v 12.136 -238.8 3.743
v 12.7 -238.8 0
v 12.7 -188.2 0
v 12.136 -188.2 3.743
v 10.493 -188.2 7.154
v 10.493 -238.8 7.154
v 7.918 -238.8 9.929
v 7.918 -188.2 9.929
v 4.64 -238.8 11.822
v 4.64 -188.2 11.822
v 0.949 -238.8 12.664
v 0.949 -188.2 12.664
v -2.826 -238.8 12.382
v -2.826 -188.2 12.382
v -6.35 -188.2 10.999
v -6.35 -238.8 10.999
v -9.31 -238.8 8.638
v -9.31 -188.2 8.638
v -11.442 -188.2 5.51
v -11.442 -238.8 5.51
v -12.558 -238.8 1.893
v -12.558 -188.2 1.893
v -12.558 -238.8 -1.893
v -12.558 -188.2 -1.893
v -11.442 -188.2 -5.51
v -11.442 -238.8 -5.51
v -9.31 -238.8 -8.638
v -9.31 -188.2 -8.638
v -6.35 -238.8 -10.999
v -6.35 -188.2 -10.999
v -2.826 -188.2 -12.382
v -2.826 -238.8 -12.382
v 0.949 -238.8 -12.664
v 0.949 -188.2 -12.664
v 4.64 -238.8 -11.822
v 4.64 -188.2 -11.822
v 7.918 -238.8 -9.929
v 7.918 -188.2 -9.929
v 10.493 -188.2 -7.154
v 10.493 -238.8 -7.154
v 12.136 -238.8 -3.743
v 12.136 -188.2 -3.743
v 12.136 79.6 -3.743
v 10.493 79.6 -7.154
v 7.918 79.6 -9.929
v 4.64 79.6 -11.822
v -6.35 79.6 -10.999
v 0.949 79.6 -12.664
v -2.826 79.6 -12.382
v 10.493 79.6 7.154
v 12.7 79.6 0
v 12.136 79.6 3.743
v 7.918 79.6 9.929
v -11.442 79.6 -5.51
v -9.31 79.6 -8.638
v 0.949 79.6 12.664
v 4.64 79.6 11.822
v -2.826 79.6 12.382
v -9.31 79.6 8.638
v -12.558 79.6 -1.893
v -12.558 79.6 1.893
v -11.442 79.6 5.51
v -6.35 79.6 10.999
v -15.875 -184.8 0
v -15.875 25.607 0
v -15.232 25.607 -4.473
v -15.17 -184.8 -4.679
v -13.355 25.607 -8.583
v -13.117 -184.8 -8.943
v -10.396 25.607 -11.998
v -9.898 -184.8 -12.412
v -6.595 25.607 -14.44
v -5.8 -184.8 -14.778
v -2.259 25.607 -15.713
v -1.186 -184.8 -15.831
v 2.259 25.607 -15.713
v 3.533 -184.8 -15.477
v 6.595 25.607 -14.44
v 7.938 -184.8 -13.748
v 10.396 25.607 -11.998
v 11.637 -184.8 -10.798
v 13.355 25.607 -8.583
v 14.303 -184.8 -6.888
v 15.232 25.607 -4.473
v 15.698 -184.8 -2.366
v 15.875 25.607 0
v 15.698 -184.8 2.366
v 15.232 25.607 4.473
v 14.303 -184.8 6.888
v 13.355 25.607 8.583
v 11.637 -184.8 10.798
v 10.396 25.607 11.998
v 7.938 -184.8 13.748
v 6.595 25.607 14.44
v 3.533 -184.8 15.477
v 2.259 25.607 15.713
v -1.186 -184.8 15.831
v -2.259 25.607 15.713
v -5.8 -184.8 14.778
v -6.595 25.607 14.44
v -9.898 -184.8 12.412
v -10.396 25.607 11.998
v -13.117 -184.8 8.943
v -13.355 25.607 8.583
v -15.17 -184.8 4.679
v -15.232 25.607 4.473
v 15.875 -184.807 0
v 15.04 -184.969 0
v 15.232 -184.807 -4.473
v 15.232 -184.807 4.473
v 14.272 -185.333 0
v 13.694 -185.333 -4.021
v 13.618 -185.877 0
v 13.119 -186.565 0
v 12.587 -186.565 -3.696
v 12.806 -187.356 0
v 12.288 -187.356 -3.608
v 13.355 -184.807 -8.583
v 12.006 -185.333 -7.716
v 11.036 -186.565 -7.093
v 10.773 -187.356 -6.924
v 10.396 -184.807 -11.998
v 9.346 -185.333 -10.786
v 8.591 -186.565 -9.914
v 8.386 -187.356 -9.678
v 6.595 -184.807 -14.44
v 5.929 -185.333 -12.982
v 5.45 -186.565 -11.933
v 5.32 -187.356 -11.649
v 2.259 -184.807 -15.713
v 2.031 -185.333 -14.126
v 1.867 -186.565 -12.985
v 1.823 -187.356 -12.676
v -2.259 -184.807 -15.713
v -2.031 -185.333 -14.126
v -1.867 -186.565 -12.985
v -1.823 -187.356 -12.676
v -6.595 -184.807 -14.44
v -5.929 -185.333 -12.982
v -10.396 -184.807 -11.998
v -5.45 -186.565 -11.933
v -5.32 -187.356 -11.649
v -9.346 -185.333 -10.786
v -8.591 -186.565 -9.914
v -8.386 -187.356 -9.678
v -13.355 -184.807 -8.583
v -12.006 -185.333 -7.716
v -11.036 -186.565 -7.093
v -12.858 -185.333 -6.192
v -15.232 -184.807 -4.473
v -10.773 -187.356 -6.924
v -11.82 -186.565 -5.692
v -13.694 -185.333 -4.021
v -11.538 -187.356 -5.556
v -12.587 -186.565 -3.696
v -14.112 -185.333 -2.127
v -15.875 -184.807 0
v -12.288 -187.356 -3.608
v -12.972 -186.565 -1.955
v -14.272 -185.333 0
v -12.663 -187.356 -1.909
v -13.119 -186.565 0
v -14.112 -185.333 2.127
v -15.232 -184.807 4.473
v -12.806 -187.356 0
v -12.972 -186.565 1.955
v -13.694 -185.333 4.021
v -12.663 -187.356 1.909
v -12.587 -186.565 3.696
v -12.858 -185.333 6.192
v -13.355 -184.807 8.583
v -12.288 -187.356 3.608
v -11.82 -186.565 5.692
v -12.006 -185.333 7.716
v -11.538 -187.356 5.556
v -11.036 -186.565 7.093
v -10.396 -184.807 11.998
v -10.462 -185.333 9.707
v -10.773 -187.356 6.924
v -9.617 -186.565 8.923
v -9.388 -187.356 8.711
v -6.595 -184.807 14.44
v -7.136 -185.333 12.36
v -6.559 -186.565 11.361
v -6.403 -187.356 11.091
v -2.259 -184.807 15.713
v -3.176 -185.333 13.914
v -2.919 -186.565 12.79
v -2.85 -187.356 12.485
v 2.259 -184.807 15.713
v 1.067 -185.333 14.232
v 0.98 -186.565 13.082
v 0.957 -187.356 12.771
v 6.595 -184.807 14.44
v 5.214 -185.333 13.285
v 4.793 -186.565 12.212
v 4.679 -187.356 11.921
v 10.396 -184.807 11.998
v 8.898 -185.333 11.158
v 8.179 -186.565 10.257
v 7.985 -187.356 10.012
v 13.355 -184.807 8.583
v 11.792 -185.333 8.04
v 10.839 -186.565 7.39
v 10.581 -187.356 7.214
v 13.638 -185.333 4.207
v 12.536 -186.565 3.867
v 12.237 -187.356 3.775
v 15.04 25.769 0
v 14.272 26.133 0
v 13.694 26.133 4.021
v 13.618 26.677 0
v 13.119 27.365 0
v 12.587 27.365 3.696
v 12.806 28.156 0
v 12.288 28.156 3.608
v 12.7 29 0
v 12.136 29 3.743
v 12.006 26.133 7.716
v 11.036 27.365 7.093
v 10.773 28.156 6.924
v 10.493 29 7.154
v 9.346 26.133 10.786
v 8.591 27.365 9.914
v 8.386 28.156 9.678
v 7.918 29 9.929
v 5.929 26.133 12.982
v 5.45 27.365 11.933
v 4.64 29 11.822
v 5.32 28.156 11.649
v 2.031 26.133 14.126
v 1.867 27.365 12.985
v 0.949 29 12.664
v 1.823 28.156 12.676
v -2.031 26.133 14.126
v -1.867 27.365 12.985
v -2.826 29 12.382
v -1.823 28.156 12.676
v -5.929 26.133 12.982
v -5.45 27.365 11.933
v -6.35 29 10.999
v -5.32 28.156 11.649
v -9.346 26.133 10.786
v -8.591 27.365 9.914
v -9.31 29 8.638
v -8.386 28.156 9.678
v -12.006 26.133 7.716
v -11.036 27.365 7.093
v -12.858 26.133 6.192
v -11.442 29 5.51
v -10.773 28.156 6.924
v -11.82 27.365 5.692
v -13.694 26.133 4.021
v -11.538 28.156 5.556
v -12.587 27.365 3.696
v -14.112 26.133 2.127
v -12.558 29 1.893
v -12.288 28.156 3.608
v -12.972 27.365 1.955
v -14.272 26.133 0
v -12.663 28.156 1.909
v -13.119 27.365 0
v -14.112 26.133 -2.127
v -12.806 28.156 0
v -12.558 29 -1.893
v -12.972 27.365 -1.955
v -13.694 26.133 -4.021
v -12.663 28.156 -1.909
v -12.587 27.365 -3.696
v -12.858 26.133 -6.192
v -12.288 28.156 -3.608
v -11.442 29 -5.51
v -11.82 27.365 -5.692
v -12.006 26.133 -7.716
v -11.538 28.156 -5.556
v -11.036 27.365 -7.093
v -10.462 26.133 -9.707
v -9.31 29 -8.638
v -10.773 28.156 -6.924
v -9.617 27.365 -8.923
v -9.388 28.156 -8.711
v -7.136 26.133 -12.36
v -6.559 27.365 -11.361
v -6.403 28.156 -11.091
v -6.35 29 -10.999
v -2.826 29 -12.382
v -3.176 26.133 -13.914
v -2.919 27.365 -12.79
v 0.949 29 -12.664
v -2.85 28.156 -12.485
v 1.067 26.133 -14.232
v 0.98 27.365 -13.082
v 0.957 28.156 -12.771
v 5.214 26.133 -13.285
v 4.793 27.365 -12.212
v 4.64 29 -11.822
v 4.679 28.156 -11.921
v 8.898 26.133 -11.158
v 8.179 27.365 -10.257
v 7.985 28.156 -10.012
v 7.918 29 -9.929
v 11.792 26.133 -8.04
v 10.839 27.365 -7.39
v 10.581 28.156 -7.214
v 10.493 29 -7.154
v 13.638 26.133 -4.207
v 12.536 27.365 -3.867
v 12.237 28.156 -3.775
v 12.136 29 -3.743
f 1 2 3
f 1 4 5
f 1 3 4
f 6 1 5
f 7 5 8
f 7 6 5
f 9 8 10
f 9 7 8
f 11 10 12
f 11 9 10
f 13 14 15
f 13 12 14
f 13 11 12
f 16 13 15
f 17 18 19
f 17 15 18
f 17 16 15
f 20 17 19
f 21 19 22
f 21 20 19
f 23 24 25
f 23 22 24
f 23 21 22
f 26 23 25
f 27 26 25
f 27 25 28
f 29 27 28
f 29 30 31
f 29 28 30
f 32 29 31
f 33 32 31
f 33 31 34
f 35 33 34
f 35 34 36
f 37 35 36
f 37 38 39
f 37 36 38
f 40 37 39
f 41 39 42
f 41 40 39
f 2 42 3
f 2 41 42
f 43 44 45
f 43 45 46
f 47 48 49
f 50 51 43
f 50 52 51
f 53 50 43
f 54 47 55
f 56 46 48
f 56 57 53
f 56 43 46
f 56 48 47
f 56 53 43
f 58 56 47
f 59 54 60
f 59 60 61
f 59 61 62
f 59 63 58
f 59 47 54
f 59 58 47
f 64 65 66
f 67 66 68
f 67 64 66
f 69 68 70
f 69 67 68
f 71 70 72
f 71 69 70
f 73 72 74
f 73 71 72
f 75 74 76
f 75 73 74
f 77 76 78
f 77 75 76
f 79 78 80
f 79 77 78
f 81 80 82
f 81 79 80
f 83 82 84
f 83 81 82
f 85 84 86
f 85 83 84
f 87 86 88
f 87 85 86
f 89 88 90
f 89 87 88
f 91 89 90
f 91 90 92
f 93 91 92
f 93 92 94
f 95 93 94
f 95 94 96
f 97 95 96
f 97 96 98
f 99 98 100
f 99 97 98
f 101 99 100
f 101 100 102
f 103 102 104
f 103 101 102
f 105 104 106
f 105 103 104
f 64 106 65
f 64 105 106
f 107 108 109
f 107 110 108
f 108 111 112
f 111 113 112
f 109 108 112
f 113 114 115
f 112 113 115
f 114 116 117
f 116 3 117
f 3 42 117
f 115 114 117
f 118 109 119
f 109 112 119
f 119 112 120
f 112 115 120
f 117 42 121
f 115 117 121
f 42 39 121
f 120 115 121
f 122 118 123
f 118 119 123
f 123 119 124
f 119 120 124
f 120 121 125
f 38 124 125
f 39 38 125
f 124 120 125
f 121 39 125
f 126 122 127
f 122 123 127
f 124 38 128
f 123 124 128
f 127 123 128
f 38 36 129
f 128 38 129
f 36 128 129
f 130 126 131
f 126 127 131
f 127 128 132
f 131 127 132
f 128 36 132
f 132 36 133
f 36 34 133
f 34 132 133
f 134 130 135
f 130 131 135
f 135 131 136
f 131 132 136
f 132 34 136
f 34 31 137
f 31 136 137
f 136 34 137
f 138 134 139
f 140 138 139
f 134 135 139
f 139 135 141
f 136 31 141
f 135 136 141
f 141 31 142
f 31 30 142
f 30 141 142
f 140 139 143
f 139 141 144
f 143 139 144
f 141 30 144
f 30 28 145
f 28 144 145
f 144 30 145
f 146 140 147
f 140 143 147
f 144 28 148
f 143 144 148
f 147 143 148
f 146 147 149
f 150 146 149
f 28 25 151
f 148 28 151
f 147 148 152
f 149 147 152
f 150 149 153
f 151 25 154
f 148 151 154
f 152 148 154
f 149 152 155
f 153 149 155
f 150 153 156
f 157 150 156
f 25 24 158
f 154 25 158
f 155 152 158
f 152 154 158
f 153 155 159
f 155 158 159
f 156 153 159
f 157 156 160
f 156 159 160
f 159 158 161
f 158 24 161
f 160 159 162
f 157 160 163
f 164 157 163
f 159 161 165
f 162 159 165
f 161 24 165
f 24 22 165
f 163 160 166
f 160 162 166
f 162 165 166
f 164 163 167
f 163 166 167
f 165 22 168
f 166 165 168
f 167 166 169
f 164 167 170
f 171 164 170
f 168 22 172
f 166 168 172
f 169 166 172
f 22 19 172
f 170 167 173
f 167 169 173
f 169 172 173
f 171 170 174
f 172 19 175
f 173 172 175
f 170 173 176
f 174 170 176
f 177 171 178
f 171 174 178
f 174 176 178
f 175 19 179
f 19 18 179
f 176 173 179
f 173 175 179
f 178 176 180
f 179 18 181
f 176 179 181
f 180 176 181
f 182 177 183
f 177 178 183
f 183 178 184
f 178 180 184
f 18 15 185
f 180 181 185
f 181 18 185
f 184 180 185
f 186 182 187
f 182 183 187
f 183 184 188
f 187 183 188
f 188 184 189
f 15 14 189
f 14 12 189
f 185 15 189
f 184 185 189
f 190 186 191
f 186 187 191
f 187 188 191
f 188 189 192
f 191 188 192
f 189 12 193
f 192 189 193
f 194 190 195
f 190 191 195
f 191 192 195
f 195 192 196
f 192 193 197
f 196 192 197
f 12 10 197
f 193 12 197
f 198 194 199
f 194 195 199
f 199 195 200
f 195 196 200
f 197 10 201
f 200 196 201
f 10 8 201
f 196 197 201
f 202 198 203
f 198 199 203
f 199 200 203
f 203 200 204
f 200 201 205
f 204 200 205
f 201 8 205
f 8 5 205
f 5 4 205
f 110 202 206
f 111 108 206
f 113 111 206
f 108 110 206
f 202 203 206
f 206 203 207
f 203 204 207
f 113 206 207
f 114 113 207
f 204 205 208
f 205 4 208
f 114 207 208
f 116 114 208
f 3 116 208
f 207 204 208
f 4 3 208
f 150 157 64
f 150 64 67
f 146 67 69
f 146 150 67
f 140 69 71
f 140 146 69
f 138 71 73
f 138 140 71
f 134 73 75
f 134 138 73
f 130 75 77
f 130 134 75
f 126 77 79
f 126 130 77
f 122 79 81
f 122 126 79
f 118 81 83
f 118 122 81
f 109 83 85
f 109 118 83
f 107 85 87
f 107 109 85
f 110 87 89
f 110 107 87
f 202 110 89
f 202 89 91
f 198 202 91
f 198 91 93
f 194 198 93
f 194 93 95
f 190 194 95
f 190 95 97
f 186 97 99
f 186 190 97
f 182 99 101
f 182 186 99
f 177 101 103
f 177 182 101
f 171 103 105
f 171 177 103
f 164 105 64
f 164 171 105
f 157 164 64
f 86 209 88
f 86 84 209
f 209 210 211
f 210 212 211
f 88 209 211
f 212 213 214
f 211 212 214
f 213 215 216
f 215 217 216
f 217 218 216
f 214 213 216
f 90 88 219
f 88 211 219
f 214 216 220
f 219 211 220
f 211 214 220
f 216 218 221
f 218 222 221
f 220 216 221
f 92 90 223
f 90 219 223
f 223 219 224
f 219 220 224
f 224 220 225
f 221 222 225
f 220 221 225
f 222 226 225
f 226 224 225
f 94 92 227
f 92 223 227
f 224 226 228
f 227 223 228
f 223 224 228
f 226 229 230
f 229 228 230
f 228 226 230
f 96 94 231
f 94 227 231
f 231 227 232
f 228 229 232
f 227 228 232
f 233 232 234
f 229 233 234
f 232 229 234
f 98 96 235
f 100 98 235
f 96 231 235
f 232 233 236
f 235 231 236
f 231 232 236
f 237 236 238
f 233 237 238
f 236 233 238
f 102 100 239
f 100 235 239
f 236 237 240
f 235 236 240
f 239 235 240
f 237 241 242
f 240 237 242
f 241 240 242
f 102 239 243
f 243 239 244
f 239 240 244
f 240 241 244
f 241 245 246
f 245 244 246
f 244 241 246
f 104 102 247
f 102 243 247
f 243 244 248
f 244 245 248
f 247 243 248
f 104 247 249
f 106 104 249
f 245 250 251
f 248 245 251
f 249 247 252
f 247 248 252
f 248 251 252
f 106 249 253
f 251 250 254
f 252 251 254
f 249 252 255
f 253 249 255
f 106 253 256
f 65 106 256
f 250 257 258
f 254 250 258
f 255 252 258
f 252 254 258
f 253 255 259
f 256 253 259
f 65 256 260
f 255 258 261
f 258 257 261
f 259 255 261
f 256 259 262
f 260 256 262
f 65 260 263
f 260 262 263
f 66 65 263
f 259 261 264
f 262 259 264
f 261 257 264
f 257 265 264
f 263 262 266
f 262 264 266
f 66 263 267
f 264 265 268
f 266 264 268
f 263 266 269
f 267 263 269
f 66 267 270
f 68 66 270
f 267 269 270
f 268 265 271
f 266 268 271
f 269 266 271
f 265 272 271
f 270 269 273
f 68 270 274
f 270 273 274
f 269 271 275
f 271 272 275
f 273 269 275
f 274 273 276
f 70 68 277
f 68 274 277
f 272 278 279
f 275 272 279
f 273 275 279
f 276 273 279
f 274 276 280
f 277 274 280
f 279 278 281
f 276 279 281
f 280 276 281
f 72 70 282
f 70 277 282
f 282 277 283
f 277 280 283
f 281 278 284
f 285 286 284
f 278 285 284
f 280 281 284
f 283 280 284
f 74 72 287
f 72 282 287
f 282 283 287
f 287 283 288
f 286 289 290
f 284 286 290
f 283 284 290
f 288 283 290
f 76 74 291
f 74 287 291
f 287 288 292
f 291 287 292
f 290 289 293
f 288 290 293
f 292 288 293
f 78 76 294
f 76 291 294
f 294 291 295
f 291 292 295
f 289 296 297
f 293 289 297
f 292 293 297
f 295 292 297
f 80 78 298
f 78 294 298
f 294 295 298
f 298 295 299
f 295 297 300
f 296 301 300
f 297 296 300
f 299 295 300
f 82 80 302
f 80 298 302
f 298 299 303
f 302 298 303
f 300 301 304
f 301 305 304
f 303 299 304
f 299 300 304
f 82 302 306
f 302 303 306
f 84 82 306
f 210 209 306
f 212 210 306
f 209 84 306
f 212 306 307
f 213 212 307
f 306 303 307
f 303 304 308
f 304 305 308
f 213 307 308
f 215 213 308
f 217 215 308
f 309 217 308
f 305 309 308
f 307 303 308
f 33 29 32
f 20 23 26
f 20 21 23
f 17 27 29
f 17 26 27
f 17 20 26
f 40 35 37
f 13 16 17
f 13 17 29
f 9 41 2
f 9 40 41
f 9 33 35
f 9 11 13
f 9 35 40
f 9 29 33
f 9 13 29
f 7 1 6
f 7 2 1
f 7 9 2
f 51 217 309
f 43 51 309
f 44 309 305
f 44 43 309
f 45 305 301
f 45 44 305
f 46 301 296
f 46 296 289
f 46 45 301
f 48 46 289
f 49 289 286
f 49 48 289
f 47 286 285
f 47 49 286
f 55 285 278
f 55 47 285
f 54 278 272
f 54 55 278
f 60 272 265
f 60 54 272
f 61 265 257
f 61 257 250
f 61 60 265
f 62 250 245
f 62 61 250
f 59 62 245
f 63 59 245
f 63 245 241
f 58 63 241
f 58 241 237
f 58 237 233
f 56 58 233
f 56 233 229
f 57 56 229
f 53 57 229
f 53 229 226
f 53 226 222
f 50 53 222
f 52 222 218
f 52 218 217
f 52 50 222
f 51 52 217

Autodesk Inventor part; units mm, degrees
ref_plane "YZ Plane" through (0, 0, 0) normal (1, 0, 0) x (0, 1, 0)
ref_plane "XZ Plane" through (0, 0, 0) normal (0, 1, 0) x (-1, 0, 0)
ref_plane "XY Plane" through (0, 0, 0) normal (0, 0, 1) x (1, 0, 0)
sketch "Sketch1" plane through (0, 0, 0) normal (0, 1, 0) x (-1, 0, 0)
  circle A0 centre (0, 0) radius 15.875
  dimension "d7" = 31.75
extrude "Extrusion1" add sketch "Sketch1" along normal mid plane 159.2
sketch "Sketch2" plane through (0, 79.6, 0) normal (0, 1, 0) x (1, 0, 0)
  circle A0 centre (0, 0) radius 12.7
  circle A1 centre (0, 0) radius 15.875 projected
  circle A2 centre (0, 0) radius 15.875
  dimension "d6" = 25.4
extrude "Extrusion2" cut sketch "Sketch2" against normal blind 54
fillet "Fillet1" radius 3.4 1 edges at (-12.7, 25.6, 0)
mirror "Mirror2" about plane through (0, -79.6, 0) normal (0, -1, 0) of "Extrusion2", "Extrusion1", "Fillet1"
thread "Thread4" size "1-14 UNS" class "2A" standard "ANSI Unified Screw Threads" length 54
thread "Thread5" size "1-14 UNS" class "2A" standard "ANSI Unified Screw Threads" length 54
properties part number "Eje Biela"
